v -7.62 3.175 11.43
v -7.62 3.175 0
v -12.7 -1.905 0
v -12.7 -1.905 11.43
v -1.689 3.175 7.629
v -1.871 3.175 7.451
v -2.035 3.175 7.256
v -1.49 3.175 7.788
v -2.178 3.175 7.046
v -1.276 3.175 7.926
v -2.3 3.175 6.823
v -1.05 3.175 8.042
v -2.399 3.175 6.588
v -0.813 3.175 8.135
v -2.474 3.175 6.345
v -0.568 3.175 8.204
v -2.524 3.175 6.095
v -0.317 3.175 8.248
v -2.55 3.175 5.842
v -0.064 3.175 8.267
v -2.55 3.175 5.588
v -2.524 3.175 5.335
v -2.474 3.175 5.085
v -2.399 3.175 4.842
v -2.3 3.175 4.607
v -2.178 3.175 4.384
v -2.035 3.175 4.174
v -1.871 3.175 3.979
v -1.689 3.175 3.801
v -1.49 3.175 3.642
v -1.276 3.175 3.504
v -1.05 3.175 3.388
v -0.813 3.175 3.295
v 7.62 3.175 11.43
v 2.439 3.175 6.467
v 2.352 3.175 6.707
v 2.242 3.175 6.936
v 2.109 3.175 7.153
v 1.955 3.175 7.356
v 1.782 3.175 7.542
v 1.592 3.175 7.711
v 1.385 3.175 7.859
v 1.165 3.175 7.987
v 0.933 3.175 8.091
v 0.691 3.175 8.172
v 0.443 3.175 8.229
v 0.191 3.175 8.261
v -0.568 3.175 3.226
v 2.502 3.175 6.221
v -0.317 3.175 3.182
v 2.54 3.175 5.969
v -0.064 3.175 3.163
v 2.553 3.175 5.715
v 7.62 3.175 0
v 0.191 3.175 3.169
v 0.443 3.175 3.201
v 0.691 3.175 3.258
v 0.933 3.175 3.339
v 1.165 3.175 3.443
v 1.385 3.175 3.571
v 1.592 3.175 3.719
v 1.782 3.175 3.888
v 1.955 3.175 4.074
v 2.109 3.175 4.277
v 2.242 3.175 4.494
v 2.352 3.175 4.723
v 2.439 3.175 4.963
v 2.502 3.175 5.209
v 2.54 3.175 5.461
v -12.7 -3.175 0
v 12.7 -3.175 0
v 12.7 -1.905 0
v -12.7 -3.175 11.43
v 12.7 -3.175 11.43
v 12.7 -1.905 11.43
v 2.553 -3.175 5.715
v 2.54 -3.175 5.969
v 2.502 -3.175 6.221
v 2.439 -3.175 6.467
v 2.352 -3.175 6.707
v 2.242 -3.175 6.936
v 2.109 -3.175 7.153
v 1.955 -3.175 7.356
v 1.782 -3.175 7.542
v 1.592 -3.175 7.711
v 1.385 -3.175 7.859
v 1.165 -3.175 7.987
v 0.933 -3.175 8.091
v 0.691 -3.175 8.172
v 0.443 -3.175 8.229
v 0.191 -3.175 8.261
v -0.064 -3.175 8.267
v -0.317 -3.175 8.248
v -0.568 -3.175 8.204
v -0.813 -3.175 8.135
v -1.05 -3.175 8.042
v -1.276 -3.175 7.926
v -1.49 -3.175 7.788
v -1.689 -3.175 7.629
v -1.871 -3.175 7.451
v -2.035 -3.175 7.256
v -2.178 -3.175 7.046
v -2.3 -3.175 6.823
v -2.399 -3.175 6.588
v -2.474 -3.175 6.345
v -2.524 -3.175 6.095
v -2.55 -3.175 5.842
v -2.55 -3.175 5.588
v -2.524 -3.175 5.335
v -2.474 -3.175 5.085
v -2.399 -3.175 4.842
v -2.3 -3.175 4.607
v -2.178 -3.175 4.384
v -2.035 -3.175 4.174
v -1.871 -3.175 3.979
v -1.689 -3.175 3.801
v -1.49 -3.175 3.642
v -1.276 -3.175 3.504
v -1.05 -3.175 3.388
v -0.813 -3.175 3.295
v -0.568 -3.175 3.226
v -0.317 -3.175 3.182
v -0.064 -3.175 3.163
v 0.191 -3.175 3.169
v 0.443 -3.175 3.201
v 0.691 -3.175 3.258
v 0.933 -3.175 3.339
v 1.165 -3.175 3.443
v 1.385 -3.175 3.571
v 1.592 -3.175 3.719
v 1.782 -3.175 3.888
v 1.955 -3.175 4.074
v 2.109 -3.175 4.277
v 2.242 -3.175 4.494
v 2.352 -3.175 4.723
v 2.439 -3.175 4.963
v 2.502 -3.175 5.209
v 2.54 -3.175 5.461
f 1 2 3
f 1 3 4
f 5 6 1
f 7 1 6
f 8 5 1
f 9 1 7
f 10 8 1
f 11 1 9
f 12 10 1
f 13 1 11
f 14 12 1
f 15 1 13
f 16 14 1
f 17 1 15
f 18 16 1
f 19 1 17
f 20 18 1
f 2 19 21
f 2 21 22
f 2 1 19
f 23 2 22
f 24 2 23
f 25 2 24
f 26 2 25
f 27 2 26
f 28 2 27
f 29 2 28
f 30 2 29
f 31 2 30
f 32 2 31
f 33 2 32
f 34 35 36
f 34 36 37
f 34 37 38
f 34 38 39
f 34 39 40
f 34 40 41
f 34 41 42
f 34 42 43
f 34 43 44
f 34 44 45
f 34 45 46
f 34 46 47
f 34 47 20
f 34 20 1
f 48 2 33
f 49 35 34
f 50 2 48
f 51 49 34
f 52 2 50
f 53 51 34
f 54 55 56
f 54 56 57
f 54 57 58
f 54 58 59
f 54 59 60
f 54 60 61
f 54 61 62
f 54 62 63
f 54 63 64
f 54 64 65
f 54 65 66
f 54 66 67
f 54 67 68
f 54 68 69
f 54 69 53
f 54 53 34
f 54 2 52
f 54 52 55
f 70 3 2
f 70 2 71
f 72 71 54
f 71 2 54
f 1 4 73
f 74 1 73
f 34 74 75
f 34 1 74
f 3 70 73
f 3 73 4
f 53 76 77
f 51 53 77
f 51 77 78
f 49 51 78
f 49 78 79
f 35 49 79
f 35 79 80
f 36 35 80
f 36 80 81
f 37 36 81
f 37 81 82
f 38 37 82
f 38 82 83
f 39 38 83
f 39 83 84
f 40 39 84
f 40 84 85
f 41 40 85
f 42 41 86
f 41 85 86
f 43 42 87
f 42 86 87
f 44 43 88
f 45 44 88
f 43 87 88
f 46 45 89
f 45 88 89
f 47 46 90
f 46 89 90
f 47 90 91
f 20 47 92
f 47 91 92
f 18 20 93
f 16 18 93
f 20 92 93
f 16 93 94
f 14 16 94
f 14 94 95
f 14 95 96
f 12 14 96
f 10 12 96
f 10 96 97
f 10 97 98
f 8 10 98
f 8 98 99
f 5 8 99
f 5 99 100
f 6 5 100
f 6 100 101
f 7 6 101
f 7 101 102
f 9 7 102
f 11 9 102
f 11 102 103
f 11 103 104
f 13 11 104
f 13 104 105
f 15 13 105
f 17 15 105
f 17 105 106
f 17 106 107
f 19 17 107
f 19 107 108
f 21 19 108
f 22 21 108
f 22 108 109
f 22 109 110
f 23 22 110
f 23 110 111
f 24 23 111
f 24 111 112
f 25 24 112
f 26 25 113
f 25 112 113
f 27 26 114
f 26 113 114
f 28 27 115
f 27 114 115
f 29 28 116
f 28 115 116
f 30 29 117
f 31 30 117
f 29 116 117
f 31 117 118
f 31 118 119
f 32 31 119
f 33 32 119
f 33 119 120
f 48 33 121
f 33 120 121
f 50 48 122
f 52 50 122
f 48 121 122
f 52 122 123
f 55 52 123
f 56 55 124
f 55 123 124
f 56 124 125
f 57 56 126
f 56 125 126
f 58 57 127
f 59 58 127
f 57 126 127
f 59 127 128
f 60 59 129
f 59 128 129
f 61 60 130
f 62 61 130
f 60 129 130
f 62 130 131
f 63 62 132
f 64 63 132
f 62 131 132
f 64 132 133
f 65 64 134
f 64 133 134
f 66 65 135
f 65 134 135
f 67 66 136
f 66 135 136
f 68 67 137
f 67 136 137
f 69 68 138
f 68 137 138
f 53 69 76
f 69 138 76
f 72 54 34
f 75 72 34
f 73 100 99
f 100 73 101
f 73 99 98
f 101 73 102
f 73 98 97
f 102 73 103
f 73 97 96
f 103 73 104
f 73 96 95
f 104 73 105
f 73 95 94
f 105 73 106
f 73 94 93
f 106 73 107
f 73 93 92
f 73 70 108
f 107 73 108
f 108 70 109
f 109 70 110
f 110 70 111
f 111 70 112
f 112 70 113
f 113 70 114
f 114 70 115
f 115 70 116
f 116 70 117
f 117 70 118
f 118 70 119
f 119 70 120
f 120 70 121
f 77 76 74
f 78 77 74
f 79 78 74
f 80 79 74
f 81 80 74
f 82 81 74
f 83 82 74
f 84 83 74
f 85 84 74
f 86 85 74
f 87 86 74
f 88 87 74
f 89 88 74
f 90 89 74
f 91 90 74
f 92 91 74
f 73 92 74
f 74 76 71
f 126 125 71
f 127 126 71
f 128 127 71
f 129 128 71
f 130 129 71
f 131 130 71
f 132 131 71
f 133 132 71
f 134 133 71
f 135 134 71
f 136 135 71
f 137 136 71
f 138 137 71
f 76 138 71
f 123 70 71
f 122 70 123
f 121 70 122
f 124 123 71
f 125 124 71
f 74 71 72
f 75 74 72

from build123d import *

# Parameters (mm, degrees)
SKETCH1_W               = 25.4
SKETCH1_H               = 6.35
BOSS_EXTRUDE1_DEPTH     = 11.43
CHAMFER2_SIZE           = 5.08
F_1_4_20_TAPPED_HOLE1_D = 5.1054


with BuildPart() as part:
    # Sketch1 → Boss-Extrude1 (new body)
    with BuildSketch(Plane.XY):
        Rectangle(SKETCH1_W, SKETCH1_H)
    extrude(amount=BOSS_EXTRUDE1_DEPTH)

    # Chamfer2
    chamfer2_edges = [part.edges().sort_by_distance(p)[0] for p in [
        (-12.7, 3.175, 5.715),
        (12.7, 3.175, 5.715),
    ]]
    chamfer(chamfer2_edges, length=CHAMFER2_SIZE)

    # 1/4-20 Tapped Hole1 (through all)
    with Locations(Plane(origin=(0, 3.175, 0), x_dir=(-1, 0, 0), z_dir=(0, 1, 0))):
        with Locations((0, 5.715)):
            Hole(F_1_4_20_TAPPED_HOLE1_D / 2)


solid = part.part
